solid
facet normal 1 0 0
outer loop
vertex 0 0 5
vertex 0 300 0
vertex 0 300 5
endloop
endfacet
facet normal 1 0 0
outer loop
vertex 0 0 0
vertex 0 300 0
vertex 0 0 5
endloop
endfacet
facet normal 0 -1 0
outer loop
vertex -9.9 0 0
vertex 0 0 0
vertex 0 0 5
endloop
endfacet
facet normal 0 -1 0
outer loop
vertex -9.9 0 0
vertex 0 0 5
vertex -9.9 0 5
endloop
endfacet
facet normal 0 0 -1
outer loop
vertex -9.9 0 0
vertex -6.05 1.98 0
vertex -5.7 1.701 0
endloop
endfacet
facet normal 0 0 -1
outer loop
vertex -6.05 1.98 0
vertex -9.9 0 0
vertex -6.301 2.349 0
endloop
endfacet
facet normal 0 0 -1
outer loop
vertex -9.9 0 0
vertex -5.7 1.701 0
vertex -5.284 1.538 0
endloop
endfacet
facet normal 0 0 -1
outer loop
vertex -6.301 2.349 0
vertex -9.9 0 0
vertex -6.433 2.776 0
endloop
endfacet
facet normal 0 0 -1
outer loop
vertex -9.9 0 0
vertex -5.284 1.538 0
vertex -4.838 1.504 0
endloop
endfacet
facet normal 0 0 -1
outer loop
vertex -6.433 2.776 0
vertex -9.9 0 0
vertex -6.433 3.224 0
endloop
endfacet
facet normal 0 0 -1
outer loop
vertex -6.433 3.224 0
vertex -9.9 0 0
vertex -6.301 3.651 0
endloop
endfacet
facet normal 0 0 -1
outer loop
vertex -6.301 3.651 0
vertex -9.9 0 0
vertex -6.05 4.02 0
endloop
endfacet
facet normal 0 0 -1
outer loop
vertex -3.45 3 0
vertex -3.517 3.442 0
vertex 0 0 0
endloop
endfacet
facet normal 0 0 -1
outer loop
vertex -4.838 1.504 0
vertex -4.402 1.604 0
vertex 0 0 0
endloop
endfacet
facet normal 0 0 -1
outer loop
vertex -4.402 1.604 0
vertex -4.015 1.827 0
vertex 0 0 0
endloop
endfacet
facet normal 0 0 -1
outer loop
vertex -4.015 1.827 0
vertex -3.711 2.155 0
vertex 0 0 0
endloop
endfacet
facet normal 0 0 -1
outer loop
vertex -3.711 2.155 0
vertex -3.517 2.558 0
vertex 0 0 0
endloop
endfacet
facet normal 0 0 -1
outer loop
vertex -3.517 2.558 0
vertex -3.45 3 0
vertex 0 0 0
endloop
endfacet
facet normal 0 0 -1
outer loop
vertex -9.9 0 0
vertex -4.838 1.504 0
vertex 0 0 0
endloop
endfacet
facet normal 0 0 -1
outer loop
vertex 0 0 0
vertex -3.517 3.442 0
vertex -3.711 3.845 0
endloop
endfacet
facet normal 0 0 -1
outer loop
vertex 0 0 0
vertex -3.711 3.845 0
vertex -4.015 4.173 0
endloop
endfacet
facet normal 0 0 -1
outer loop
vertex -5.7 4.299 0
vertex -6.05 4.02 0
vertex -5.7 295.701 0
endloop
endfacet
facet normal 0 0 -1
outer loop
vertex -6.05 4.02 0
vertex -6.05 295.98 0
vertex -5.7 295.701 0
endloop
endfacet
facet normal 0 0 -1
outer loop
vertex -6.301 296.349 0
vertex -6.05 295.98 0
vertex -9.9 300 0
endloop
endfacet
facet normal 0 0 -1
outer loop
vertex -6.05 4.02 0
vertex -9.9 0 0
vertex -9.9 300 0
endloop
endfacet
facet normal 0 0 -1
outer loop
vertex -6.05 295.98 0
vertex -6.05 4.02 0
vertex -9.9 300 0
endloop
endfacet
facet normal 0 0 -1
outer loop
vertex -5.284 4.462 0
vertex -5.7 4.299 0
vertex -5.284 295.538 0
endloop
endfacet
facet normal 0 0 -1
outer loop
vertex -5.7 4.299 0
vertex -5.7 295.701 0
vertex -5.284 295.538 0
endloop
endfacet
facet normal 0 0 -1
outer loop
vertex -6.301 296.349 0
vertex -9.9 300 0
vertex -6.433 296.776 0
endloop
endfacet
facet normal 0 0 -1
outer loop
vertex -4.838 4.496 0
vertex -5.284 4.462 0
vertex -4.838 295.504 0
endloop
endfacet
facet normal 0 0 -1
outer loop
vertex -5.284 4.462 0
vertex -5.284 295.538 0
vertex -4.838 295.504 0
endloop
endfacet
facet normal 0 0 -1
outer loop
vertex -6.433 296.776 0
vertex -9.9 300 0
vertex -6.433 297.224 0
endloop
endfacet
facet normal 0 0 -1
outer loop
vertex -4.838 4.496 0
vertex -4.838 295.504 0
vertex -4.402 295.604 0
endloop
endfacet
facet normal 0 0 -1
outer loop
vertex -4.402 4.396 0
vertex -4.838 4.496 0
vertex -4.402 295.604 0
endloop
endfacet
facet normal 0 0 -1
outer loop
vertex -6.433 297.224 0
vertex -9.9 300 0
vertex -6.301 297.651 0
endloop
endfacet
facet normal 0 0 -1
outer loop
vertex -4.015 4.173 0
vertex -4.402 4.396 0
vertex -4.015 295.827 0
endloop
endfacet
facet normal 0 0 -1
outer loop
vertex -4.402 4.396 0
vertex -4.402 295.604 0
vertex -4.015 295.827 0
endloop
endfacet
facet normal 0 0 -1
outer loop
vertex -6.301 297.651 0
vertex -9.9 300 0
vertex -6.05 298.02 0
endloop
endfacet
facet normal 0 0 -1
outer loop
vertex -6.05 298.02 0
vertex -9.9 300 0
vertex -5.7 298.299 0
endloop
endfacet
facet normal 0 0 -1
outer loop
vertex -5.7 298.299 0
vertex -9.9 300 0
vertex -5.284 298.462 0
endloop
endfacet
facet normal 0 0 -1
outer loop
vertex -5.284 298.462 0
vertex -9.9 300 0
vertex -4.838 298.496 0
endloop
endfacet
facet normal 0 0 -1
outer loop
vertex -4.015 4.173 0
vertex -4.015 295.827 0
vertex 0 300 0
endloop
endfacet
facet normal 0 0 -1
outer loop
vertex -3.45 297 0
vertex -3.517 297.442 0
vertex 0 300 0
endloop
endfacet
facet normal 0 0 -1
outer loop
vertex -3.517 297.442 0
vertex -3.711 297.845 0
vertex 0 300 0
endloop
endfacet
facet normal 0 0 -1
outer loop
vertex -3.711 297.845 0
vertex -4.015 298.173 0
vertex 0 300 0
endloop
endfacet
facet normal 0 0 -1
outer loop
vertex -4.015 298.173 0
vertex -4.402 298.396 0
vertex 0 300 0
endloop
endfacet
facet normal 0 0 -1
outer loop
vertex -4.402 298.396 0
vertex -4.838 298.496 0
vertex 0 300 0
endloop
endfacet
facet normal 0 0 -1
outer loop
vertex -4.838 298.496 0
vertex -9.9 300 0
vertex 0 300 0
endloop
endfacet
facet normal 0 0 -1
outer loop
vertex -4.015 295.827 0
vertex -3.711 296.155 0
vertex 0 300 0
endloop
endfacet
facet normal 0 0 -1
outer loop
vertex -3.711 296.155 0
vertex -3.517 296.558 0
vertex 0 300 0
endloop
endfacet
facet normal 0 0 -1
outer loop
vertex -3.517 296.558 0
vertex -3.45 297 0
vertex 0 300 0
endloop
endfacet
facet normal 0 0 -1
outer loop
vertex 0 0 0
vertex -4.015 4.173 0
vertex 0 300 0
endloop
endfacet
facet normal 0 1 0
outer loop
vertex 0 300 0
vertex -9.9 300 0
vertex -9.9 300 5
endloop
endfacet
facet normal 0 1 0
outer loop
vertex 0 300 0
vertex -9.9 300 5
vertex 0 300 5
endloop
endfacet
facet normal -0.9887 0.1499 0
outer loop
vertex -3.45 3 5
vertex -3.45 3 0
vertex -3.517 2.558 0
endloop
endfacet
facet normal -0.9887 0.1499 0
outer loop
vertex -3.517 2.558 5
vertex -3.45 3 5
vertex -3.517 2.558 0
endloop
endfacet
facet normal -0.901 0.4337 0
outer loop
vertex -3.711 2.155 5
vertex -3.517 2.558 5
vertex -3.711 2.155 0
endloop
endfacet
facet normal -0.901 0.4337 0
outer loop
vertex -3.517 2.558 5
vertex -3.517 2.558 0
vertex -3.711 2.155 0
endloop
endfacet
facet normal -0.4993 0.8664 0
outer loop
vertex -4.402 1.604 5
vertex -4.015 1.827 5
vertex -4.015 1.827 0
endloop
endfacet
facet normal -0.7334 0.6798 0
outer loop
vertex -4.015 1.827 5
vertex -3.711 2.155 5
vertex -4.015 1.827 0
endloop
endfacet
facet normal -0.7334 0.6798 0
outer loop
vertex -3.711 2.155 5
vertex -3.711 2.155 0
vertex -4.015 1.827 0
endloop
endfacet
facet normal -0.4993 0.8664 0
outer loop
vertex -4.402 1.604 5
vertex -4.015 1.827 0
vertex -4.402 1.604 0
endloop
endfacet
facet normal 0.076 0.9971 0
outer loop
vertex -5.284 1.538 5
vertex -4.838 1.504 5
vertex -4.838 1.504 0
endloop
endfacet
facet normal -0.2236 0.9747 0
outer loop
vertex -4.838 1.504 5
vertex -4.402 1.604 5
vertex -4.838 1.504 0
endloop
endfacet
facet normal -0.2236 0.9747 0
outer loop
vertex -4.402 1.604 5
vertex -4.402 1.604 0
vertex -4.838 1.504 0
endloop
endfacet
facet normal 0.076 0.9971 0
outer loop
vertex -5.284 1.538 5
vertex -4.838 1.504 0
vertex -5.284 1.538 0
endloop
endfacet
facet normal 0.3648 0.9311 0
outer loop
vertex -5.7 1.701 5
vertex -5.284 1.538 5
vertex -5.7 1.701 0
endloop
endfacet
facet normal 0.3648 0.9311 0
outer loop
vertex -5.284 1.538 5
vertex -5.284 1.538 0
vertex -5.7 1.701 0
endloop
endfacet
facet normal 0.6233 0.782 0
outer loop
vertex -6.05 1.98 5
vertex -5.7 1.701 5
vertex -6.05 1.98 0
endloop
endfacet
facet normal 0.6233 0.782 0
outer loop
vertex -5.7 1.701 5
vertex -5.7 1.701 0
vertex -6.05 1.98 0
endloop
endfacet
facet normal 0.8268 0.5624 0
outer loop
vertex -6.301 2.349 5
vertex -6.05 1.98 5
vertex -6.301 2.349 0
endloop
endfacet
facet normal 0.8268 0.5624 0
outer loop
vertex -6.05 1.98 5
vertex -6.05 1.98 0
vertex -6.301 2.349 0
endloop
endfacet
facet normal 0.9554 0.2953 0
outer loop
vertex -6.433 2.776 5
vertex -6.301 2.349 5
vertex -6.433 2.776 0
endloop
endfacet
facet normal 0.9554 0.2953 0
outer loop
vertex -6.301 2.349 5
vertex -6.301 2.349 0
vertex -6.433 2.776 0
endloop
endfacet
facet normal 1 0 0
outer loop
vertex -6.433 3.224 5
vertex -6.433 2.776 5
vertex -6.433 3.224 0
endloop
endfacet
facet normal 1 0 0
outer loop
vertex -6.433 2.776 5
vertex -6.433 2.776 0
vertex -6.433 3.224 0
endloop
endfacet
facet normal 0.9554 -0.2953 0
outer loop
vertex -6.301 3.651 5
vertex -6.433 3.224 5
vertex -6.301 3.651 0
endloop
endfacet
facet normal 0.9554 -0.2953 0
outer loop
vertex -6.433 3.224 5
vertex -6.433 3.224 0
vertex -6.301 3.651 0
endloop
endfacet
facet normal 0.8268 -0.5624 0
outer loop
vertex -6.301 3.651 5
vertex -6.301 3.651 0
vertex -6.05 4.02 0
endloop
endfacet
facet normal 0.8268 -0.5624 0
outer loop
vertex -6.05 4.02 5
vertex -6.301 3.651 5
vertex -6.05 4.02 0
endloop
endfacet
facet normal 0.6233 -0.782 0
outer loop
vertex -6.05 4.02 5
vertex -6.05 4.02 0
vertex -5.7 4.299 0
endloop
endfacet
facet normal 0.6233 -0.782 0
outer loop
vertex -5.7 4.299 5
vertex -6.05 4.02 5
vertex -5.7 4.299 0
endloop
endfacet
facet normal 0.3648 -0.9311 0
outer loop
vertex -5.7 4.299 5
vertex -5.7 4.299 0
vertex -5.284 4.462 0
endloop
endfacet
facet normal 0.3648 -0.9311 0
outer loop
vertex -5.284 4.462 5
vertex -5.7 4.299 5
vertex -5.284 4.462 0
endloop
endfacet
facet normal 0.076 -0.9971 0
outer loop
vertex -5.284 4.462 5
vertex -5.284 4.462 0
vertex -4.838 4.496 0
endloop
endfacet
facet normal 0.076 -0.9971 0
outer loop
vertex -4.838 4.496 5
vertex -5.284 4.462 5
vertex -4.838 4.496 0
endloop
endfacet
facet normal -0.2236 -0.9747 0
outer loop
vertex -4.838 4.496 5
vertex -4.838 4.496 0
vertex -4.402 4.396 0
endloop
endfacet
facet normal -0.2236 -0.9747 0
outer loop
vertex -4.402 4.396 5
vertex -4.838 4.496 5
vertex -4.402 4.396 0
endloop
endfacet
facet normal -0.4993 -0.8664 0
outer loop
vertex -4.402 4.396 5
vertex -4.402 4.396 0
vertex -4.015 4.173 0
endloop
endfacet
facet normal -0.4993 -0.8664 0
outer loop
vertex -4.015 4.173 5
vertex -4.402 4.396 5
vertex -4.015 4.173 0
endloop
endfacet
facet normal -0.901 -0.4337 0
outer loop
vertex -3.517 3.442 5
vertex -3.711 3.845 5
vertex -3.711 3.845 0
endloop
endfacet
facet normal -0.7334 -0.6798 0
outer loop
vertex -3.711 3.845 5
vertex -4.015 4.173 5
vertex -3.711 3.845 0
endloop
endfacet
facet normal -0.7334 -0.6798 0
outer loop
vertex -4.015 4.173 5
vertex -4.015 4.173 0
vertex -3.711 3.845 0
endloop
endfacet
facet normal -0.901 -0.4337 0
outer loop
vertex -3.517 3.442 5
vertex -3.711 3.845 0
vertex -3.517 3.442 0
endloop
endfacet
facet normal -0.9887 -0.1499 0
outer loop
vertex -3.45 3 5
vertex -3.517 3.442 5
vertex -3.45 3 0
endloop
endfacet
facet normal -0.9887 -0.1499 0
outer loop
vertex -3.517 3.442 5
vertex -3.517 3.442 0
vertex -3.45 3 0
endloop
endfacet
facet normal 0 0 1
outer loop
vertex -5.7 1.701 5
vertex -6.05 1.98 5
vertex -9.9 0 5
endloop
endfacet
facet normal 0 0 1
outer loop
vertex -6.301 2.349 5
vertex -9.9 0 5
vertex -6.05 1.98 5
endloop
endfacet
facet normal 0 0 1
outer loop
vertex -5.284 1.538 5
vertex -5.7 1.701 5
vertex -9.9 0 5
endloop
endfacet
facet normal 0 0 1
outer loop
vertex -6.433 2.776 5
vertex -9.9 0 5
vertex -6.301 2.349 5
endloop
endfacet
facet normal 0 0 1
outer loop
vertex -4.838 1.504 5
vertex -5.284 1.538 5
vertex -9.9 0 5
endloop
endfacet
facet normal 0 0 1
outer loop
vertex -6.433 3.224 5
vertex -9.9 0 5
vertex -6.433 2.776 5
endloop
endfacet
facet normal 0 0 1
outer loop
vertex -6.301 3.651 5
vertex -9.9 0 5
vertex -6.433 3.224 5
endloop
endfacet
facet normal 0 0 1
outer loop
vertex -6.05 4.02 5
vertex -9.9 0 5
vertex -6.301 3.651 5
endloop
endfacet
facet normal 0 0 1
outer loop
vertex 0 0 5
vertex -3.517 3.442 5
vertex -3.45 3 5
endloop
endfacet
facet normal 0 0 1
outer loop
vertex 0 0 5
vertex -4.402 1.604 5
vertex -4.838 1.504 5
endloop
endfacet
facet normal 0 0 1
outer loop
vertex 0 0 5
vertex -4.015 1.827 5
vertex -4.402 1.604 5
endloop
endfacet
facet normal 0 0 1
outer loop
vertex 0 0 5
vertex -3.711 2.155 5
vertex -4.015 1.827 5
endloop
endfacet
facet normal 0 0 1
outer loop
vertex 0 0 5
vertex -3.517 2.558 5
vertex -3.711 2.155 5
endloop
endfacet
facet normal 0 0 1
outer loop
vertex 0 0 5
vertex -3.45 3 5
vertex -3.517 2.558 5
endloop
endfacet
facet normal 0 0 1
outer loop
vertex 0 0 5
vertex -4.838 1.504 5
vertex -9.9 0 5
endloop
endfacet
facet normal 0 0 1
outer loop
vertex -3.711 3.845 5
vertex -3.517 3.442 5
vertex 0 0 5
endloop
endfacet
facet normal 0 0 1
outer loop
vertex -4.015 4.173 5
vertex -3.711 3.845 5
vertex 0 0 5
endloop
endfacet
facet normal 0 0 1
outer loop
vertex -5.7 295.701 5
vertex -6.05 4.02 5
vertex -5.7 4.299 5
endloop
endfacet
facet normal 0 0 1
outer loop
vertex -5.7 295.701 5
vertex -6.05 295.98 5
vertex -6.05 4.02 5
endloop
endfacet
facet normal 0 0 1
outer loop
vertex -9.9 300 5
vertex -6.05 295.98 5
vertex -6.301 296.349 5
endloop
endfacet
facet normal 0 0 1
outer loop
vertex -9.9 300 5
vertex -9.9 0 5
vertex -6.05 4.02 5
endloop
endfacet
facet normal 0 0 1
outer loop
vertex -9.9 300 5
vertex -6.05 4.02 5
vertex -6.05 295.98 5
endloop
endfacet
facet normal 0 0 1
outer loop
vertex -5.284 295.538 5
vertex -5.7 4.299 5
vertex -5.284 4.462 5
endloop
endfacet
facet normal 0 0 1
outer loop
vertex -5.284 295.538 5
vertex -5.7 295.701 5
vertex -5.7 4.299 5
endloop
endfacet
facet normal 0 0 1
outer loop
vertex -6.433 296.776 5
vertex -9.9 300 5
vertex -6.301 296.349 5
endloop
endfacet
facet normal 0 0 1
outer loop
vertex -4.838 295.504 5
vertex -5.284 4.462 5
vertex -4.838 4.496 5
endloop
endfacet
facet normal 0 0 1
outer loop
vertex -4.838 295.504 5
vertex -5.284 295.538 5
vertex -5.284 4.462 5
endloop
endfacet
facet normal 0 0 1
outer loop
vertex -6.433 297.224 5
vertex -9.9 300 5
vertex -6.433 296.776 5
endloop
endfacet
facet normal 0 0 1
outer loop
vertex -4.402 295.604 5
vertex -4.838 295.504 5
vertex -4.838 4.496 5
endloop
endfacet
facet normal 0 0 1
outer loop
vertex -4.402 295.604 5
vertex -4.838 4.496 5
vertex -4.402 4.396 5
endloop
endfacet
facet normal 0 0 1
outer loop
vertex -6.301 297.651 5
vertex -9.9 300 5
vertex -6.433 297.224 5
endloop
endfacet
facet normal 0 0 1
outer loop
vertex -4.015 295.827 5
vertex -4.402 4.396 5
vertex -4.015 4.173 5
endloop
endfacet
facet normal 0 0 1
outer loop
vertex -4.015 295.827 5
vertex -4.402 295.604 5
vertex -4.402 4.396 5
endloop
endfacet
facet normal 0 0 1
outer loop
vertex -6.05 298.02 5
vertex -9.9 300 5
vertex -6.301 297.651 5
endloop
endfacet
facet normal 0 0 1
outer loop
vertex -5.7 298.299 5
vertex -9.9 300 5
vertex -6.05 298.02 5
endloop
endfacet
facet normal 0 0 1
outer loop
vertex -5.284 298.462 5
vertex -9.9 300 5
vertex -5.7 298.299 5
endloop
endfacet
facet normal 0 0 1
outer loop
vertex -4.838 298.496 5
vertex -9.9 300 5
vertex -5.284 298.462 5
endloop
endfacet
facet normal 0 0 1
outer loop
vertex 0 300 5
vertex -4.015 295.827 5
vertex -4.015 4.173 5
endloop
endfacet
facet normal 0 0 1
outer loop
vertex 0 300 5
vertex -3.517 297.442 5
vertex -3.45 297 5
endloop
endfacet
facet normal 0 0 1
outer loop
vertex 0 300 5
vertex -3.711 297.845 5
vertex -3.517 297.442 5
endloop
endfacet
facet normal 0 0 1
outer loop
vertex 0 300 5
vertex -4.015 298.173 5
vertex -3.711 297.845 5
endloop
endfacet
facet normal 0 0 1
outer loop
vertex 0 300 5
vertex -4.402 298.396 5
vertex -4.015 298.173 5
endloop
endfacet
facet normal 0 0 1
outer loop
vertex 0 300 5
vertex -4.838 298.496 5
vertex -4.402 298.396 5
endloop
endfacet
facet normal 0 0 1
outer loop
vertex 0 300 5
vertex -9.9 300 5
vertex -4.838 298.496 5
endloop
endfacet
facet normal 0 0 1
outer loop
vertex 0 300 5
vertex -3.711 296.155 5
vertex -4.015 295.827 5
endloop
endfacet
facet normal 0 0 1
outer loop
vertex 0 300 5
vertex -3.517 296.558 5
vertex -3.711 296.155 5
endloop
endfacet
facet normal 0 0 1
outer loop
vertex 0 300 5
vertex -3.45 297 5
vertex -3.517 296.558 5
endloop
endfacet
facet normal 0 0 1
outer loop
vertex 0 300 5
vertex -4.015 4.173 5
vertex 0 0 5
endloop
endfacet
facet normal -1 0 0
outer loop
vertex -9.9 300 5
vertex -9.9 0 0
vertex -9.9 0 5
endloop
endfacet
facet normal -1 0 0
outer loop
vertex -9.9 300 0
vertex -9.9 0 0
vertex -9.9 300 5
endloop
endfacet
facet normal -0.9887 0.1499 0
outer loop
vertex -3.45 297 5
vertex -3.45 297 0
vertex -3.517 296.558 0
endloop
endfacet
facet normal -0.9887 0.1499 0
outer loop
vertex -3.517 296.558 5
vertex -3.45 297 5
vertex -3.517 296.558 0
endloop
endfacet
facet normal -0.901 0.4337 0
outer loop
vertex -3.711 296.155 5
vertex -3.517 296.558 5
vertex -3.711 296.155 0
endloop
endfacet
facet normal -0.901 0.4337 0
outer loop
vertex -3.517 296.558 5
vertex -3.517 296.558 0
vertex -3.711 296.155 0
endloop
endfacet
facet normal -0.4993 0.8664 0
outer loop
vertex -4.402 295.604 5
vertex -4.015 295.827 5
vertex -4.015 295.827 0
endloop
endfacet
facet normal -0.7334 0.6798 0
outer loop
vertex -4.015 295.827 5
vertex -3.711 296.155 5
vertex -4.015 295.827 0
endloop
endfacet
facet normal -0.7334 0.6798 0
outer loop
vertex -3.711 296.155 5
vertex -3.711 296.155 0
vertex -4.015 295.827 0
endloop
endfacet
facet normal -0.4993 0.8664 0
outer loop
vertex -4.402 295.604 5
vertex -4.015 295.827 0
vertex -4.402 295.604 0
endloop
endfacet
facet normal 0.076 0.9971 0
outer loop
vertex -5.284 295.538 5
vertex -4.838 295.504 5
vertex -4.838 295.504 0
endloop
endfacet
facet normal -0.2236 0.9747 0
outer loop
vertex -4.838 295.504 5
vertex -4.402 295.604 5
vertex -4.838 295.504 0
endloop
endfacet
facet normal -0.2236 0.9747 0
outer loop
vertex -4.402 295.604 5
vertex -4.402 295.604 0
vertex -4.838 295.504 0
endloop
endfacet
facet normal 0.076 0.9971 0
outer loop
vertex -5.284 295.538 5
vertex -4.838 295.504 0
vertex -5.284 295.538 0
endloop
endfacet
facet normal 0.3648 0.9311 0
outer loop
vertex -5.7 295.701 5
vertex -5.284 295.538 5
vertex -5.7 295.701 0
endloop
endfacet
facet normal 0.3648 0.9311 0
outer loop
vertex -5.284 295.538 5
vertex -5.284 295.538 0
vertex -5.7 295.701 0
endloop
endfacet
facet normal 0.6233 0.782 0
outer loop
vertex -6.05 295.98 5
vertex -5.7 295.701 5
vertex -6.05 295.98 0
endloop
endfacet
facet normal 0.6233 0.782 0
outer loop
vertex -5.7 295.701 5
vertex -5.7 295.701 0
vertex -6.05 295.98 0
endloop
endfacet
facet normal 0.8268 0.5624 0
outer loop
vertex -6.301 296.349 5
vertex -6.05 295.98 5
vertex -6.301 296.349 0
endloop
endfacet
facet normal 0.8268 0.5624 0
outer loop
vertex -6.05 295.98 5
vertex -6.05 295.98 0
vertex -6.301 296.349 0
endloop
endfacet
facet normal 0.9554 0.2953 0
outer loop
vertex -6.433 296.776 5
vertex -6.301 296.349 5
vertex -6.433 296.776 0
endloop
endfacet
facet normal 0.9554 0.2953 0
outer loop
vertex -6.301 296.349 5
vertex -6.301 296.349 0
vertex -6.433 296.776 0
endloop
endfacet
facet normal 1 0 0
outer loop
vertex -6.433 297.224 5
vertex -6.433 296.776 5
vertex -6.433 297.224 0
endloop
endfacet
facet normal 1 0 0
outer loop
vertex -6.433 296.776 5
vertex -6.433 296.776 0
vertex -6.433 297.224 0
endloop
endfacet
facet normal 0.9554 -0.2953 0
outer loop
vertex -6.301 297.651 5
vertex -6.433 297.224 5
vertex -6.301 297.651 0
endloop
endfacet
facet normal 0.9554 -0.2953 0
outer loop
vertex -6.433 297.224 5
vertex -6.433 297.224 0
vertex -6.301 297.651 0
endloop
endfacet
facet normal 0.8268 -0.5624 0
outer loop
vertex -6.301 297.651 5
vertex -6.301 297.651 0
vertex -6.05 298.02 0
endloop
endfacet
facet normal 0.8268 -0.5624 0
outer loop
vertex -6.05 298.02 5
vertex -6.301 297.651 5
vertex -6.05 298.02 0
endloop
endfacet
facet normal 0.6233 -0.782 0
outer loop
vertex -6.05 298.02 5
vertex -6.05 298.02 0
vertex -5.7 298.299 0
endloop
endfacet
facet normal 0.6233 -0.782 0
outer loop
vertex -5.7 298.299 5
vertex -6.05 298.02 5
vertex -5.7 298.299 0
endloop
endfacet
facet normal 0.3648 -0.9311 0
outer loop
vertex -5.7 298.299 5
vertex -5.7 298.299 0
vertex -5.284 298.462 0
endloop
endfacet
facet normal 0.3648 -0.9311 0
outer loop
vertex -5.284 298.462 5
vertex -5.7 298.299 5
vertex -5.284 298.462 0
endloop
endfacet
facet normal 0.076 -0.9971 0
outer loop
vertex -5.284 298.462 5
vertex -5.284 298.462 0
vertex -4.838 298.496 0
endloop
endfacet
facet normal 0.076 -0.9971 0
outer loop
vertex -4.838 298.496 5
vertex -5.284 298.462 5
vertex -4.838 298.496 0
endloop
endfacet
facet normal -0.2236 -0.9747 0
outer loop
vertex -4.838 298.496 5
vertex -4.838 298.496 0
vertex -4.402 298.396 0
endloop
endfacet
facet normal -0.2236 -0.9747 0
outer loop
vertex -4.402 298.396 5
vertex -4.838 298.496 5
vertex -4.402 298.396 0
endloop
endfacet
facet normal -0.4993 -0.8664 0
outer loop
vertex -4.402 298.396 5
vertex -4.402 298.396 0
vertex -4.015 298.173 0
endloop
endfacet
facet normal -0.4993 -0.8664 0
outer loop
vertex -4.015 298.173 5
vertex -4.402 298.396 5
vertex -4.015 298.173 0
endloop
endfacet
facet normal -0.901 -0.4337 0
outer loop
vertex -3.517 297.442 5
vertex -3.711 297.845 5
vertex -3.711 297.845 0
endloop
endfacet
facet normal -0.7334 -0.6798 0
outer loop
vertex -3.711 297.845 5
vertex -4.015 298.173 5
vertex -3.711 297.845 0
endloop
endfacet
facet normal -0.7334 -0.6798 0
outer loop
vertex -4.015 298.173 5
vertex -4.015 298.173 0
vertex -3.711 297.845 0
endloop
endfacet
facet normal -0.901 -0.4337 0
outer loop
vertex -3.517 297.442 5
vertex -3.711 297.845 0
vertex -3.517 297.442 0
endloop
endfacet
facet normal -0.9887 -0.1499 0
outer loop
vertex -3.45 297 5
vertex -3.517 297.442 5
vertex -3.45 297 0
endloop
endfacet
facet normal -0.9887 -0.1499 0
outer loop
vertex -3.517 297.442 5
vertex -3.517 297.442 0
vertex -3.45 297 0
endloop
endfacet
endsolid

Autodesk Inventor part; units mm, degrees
ref_plane "YZ Plane" through (0, 0, 0) normal (1, 0, 0) x (0, 1, 0)
ref_plane "XZ Plane" through (0, 0, 0) normal (0, 1, 0) x (-1, 0, 0)
ref_plane "XY Plane" through (0, 0, 0) normal (0, 0, 1) x (1, 0, 0)
sketch "Sketch2" plane through (0, 0, 0) normal (0, 0, 1) x (1, 0, 0)
  circle A0 centre (-4.95, 3) radius 1.5
  line L0 (0, 0) -> (-9.9, 0)
  line L1 (-9.9, 0) -> (-9.9, 300)
  line L2 (-9.9, 300) -> (0, 300)
  line L3 (0, 300) -> (0, 0)
  circle A1 centre (-4.95, 297) radius 1.5
  dimension "d53" = 3
  dimension "d54" = 9.9
  dimension "d55" = 300
  dimension "d56" = 3
extrude "Extrusion7" add sketch "Sketch2" along normal blind 5
properties part number "Cube_Holder_SB_V1_(71mm)"
